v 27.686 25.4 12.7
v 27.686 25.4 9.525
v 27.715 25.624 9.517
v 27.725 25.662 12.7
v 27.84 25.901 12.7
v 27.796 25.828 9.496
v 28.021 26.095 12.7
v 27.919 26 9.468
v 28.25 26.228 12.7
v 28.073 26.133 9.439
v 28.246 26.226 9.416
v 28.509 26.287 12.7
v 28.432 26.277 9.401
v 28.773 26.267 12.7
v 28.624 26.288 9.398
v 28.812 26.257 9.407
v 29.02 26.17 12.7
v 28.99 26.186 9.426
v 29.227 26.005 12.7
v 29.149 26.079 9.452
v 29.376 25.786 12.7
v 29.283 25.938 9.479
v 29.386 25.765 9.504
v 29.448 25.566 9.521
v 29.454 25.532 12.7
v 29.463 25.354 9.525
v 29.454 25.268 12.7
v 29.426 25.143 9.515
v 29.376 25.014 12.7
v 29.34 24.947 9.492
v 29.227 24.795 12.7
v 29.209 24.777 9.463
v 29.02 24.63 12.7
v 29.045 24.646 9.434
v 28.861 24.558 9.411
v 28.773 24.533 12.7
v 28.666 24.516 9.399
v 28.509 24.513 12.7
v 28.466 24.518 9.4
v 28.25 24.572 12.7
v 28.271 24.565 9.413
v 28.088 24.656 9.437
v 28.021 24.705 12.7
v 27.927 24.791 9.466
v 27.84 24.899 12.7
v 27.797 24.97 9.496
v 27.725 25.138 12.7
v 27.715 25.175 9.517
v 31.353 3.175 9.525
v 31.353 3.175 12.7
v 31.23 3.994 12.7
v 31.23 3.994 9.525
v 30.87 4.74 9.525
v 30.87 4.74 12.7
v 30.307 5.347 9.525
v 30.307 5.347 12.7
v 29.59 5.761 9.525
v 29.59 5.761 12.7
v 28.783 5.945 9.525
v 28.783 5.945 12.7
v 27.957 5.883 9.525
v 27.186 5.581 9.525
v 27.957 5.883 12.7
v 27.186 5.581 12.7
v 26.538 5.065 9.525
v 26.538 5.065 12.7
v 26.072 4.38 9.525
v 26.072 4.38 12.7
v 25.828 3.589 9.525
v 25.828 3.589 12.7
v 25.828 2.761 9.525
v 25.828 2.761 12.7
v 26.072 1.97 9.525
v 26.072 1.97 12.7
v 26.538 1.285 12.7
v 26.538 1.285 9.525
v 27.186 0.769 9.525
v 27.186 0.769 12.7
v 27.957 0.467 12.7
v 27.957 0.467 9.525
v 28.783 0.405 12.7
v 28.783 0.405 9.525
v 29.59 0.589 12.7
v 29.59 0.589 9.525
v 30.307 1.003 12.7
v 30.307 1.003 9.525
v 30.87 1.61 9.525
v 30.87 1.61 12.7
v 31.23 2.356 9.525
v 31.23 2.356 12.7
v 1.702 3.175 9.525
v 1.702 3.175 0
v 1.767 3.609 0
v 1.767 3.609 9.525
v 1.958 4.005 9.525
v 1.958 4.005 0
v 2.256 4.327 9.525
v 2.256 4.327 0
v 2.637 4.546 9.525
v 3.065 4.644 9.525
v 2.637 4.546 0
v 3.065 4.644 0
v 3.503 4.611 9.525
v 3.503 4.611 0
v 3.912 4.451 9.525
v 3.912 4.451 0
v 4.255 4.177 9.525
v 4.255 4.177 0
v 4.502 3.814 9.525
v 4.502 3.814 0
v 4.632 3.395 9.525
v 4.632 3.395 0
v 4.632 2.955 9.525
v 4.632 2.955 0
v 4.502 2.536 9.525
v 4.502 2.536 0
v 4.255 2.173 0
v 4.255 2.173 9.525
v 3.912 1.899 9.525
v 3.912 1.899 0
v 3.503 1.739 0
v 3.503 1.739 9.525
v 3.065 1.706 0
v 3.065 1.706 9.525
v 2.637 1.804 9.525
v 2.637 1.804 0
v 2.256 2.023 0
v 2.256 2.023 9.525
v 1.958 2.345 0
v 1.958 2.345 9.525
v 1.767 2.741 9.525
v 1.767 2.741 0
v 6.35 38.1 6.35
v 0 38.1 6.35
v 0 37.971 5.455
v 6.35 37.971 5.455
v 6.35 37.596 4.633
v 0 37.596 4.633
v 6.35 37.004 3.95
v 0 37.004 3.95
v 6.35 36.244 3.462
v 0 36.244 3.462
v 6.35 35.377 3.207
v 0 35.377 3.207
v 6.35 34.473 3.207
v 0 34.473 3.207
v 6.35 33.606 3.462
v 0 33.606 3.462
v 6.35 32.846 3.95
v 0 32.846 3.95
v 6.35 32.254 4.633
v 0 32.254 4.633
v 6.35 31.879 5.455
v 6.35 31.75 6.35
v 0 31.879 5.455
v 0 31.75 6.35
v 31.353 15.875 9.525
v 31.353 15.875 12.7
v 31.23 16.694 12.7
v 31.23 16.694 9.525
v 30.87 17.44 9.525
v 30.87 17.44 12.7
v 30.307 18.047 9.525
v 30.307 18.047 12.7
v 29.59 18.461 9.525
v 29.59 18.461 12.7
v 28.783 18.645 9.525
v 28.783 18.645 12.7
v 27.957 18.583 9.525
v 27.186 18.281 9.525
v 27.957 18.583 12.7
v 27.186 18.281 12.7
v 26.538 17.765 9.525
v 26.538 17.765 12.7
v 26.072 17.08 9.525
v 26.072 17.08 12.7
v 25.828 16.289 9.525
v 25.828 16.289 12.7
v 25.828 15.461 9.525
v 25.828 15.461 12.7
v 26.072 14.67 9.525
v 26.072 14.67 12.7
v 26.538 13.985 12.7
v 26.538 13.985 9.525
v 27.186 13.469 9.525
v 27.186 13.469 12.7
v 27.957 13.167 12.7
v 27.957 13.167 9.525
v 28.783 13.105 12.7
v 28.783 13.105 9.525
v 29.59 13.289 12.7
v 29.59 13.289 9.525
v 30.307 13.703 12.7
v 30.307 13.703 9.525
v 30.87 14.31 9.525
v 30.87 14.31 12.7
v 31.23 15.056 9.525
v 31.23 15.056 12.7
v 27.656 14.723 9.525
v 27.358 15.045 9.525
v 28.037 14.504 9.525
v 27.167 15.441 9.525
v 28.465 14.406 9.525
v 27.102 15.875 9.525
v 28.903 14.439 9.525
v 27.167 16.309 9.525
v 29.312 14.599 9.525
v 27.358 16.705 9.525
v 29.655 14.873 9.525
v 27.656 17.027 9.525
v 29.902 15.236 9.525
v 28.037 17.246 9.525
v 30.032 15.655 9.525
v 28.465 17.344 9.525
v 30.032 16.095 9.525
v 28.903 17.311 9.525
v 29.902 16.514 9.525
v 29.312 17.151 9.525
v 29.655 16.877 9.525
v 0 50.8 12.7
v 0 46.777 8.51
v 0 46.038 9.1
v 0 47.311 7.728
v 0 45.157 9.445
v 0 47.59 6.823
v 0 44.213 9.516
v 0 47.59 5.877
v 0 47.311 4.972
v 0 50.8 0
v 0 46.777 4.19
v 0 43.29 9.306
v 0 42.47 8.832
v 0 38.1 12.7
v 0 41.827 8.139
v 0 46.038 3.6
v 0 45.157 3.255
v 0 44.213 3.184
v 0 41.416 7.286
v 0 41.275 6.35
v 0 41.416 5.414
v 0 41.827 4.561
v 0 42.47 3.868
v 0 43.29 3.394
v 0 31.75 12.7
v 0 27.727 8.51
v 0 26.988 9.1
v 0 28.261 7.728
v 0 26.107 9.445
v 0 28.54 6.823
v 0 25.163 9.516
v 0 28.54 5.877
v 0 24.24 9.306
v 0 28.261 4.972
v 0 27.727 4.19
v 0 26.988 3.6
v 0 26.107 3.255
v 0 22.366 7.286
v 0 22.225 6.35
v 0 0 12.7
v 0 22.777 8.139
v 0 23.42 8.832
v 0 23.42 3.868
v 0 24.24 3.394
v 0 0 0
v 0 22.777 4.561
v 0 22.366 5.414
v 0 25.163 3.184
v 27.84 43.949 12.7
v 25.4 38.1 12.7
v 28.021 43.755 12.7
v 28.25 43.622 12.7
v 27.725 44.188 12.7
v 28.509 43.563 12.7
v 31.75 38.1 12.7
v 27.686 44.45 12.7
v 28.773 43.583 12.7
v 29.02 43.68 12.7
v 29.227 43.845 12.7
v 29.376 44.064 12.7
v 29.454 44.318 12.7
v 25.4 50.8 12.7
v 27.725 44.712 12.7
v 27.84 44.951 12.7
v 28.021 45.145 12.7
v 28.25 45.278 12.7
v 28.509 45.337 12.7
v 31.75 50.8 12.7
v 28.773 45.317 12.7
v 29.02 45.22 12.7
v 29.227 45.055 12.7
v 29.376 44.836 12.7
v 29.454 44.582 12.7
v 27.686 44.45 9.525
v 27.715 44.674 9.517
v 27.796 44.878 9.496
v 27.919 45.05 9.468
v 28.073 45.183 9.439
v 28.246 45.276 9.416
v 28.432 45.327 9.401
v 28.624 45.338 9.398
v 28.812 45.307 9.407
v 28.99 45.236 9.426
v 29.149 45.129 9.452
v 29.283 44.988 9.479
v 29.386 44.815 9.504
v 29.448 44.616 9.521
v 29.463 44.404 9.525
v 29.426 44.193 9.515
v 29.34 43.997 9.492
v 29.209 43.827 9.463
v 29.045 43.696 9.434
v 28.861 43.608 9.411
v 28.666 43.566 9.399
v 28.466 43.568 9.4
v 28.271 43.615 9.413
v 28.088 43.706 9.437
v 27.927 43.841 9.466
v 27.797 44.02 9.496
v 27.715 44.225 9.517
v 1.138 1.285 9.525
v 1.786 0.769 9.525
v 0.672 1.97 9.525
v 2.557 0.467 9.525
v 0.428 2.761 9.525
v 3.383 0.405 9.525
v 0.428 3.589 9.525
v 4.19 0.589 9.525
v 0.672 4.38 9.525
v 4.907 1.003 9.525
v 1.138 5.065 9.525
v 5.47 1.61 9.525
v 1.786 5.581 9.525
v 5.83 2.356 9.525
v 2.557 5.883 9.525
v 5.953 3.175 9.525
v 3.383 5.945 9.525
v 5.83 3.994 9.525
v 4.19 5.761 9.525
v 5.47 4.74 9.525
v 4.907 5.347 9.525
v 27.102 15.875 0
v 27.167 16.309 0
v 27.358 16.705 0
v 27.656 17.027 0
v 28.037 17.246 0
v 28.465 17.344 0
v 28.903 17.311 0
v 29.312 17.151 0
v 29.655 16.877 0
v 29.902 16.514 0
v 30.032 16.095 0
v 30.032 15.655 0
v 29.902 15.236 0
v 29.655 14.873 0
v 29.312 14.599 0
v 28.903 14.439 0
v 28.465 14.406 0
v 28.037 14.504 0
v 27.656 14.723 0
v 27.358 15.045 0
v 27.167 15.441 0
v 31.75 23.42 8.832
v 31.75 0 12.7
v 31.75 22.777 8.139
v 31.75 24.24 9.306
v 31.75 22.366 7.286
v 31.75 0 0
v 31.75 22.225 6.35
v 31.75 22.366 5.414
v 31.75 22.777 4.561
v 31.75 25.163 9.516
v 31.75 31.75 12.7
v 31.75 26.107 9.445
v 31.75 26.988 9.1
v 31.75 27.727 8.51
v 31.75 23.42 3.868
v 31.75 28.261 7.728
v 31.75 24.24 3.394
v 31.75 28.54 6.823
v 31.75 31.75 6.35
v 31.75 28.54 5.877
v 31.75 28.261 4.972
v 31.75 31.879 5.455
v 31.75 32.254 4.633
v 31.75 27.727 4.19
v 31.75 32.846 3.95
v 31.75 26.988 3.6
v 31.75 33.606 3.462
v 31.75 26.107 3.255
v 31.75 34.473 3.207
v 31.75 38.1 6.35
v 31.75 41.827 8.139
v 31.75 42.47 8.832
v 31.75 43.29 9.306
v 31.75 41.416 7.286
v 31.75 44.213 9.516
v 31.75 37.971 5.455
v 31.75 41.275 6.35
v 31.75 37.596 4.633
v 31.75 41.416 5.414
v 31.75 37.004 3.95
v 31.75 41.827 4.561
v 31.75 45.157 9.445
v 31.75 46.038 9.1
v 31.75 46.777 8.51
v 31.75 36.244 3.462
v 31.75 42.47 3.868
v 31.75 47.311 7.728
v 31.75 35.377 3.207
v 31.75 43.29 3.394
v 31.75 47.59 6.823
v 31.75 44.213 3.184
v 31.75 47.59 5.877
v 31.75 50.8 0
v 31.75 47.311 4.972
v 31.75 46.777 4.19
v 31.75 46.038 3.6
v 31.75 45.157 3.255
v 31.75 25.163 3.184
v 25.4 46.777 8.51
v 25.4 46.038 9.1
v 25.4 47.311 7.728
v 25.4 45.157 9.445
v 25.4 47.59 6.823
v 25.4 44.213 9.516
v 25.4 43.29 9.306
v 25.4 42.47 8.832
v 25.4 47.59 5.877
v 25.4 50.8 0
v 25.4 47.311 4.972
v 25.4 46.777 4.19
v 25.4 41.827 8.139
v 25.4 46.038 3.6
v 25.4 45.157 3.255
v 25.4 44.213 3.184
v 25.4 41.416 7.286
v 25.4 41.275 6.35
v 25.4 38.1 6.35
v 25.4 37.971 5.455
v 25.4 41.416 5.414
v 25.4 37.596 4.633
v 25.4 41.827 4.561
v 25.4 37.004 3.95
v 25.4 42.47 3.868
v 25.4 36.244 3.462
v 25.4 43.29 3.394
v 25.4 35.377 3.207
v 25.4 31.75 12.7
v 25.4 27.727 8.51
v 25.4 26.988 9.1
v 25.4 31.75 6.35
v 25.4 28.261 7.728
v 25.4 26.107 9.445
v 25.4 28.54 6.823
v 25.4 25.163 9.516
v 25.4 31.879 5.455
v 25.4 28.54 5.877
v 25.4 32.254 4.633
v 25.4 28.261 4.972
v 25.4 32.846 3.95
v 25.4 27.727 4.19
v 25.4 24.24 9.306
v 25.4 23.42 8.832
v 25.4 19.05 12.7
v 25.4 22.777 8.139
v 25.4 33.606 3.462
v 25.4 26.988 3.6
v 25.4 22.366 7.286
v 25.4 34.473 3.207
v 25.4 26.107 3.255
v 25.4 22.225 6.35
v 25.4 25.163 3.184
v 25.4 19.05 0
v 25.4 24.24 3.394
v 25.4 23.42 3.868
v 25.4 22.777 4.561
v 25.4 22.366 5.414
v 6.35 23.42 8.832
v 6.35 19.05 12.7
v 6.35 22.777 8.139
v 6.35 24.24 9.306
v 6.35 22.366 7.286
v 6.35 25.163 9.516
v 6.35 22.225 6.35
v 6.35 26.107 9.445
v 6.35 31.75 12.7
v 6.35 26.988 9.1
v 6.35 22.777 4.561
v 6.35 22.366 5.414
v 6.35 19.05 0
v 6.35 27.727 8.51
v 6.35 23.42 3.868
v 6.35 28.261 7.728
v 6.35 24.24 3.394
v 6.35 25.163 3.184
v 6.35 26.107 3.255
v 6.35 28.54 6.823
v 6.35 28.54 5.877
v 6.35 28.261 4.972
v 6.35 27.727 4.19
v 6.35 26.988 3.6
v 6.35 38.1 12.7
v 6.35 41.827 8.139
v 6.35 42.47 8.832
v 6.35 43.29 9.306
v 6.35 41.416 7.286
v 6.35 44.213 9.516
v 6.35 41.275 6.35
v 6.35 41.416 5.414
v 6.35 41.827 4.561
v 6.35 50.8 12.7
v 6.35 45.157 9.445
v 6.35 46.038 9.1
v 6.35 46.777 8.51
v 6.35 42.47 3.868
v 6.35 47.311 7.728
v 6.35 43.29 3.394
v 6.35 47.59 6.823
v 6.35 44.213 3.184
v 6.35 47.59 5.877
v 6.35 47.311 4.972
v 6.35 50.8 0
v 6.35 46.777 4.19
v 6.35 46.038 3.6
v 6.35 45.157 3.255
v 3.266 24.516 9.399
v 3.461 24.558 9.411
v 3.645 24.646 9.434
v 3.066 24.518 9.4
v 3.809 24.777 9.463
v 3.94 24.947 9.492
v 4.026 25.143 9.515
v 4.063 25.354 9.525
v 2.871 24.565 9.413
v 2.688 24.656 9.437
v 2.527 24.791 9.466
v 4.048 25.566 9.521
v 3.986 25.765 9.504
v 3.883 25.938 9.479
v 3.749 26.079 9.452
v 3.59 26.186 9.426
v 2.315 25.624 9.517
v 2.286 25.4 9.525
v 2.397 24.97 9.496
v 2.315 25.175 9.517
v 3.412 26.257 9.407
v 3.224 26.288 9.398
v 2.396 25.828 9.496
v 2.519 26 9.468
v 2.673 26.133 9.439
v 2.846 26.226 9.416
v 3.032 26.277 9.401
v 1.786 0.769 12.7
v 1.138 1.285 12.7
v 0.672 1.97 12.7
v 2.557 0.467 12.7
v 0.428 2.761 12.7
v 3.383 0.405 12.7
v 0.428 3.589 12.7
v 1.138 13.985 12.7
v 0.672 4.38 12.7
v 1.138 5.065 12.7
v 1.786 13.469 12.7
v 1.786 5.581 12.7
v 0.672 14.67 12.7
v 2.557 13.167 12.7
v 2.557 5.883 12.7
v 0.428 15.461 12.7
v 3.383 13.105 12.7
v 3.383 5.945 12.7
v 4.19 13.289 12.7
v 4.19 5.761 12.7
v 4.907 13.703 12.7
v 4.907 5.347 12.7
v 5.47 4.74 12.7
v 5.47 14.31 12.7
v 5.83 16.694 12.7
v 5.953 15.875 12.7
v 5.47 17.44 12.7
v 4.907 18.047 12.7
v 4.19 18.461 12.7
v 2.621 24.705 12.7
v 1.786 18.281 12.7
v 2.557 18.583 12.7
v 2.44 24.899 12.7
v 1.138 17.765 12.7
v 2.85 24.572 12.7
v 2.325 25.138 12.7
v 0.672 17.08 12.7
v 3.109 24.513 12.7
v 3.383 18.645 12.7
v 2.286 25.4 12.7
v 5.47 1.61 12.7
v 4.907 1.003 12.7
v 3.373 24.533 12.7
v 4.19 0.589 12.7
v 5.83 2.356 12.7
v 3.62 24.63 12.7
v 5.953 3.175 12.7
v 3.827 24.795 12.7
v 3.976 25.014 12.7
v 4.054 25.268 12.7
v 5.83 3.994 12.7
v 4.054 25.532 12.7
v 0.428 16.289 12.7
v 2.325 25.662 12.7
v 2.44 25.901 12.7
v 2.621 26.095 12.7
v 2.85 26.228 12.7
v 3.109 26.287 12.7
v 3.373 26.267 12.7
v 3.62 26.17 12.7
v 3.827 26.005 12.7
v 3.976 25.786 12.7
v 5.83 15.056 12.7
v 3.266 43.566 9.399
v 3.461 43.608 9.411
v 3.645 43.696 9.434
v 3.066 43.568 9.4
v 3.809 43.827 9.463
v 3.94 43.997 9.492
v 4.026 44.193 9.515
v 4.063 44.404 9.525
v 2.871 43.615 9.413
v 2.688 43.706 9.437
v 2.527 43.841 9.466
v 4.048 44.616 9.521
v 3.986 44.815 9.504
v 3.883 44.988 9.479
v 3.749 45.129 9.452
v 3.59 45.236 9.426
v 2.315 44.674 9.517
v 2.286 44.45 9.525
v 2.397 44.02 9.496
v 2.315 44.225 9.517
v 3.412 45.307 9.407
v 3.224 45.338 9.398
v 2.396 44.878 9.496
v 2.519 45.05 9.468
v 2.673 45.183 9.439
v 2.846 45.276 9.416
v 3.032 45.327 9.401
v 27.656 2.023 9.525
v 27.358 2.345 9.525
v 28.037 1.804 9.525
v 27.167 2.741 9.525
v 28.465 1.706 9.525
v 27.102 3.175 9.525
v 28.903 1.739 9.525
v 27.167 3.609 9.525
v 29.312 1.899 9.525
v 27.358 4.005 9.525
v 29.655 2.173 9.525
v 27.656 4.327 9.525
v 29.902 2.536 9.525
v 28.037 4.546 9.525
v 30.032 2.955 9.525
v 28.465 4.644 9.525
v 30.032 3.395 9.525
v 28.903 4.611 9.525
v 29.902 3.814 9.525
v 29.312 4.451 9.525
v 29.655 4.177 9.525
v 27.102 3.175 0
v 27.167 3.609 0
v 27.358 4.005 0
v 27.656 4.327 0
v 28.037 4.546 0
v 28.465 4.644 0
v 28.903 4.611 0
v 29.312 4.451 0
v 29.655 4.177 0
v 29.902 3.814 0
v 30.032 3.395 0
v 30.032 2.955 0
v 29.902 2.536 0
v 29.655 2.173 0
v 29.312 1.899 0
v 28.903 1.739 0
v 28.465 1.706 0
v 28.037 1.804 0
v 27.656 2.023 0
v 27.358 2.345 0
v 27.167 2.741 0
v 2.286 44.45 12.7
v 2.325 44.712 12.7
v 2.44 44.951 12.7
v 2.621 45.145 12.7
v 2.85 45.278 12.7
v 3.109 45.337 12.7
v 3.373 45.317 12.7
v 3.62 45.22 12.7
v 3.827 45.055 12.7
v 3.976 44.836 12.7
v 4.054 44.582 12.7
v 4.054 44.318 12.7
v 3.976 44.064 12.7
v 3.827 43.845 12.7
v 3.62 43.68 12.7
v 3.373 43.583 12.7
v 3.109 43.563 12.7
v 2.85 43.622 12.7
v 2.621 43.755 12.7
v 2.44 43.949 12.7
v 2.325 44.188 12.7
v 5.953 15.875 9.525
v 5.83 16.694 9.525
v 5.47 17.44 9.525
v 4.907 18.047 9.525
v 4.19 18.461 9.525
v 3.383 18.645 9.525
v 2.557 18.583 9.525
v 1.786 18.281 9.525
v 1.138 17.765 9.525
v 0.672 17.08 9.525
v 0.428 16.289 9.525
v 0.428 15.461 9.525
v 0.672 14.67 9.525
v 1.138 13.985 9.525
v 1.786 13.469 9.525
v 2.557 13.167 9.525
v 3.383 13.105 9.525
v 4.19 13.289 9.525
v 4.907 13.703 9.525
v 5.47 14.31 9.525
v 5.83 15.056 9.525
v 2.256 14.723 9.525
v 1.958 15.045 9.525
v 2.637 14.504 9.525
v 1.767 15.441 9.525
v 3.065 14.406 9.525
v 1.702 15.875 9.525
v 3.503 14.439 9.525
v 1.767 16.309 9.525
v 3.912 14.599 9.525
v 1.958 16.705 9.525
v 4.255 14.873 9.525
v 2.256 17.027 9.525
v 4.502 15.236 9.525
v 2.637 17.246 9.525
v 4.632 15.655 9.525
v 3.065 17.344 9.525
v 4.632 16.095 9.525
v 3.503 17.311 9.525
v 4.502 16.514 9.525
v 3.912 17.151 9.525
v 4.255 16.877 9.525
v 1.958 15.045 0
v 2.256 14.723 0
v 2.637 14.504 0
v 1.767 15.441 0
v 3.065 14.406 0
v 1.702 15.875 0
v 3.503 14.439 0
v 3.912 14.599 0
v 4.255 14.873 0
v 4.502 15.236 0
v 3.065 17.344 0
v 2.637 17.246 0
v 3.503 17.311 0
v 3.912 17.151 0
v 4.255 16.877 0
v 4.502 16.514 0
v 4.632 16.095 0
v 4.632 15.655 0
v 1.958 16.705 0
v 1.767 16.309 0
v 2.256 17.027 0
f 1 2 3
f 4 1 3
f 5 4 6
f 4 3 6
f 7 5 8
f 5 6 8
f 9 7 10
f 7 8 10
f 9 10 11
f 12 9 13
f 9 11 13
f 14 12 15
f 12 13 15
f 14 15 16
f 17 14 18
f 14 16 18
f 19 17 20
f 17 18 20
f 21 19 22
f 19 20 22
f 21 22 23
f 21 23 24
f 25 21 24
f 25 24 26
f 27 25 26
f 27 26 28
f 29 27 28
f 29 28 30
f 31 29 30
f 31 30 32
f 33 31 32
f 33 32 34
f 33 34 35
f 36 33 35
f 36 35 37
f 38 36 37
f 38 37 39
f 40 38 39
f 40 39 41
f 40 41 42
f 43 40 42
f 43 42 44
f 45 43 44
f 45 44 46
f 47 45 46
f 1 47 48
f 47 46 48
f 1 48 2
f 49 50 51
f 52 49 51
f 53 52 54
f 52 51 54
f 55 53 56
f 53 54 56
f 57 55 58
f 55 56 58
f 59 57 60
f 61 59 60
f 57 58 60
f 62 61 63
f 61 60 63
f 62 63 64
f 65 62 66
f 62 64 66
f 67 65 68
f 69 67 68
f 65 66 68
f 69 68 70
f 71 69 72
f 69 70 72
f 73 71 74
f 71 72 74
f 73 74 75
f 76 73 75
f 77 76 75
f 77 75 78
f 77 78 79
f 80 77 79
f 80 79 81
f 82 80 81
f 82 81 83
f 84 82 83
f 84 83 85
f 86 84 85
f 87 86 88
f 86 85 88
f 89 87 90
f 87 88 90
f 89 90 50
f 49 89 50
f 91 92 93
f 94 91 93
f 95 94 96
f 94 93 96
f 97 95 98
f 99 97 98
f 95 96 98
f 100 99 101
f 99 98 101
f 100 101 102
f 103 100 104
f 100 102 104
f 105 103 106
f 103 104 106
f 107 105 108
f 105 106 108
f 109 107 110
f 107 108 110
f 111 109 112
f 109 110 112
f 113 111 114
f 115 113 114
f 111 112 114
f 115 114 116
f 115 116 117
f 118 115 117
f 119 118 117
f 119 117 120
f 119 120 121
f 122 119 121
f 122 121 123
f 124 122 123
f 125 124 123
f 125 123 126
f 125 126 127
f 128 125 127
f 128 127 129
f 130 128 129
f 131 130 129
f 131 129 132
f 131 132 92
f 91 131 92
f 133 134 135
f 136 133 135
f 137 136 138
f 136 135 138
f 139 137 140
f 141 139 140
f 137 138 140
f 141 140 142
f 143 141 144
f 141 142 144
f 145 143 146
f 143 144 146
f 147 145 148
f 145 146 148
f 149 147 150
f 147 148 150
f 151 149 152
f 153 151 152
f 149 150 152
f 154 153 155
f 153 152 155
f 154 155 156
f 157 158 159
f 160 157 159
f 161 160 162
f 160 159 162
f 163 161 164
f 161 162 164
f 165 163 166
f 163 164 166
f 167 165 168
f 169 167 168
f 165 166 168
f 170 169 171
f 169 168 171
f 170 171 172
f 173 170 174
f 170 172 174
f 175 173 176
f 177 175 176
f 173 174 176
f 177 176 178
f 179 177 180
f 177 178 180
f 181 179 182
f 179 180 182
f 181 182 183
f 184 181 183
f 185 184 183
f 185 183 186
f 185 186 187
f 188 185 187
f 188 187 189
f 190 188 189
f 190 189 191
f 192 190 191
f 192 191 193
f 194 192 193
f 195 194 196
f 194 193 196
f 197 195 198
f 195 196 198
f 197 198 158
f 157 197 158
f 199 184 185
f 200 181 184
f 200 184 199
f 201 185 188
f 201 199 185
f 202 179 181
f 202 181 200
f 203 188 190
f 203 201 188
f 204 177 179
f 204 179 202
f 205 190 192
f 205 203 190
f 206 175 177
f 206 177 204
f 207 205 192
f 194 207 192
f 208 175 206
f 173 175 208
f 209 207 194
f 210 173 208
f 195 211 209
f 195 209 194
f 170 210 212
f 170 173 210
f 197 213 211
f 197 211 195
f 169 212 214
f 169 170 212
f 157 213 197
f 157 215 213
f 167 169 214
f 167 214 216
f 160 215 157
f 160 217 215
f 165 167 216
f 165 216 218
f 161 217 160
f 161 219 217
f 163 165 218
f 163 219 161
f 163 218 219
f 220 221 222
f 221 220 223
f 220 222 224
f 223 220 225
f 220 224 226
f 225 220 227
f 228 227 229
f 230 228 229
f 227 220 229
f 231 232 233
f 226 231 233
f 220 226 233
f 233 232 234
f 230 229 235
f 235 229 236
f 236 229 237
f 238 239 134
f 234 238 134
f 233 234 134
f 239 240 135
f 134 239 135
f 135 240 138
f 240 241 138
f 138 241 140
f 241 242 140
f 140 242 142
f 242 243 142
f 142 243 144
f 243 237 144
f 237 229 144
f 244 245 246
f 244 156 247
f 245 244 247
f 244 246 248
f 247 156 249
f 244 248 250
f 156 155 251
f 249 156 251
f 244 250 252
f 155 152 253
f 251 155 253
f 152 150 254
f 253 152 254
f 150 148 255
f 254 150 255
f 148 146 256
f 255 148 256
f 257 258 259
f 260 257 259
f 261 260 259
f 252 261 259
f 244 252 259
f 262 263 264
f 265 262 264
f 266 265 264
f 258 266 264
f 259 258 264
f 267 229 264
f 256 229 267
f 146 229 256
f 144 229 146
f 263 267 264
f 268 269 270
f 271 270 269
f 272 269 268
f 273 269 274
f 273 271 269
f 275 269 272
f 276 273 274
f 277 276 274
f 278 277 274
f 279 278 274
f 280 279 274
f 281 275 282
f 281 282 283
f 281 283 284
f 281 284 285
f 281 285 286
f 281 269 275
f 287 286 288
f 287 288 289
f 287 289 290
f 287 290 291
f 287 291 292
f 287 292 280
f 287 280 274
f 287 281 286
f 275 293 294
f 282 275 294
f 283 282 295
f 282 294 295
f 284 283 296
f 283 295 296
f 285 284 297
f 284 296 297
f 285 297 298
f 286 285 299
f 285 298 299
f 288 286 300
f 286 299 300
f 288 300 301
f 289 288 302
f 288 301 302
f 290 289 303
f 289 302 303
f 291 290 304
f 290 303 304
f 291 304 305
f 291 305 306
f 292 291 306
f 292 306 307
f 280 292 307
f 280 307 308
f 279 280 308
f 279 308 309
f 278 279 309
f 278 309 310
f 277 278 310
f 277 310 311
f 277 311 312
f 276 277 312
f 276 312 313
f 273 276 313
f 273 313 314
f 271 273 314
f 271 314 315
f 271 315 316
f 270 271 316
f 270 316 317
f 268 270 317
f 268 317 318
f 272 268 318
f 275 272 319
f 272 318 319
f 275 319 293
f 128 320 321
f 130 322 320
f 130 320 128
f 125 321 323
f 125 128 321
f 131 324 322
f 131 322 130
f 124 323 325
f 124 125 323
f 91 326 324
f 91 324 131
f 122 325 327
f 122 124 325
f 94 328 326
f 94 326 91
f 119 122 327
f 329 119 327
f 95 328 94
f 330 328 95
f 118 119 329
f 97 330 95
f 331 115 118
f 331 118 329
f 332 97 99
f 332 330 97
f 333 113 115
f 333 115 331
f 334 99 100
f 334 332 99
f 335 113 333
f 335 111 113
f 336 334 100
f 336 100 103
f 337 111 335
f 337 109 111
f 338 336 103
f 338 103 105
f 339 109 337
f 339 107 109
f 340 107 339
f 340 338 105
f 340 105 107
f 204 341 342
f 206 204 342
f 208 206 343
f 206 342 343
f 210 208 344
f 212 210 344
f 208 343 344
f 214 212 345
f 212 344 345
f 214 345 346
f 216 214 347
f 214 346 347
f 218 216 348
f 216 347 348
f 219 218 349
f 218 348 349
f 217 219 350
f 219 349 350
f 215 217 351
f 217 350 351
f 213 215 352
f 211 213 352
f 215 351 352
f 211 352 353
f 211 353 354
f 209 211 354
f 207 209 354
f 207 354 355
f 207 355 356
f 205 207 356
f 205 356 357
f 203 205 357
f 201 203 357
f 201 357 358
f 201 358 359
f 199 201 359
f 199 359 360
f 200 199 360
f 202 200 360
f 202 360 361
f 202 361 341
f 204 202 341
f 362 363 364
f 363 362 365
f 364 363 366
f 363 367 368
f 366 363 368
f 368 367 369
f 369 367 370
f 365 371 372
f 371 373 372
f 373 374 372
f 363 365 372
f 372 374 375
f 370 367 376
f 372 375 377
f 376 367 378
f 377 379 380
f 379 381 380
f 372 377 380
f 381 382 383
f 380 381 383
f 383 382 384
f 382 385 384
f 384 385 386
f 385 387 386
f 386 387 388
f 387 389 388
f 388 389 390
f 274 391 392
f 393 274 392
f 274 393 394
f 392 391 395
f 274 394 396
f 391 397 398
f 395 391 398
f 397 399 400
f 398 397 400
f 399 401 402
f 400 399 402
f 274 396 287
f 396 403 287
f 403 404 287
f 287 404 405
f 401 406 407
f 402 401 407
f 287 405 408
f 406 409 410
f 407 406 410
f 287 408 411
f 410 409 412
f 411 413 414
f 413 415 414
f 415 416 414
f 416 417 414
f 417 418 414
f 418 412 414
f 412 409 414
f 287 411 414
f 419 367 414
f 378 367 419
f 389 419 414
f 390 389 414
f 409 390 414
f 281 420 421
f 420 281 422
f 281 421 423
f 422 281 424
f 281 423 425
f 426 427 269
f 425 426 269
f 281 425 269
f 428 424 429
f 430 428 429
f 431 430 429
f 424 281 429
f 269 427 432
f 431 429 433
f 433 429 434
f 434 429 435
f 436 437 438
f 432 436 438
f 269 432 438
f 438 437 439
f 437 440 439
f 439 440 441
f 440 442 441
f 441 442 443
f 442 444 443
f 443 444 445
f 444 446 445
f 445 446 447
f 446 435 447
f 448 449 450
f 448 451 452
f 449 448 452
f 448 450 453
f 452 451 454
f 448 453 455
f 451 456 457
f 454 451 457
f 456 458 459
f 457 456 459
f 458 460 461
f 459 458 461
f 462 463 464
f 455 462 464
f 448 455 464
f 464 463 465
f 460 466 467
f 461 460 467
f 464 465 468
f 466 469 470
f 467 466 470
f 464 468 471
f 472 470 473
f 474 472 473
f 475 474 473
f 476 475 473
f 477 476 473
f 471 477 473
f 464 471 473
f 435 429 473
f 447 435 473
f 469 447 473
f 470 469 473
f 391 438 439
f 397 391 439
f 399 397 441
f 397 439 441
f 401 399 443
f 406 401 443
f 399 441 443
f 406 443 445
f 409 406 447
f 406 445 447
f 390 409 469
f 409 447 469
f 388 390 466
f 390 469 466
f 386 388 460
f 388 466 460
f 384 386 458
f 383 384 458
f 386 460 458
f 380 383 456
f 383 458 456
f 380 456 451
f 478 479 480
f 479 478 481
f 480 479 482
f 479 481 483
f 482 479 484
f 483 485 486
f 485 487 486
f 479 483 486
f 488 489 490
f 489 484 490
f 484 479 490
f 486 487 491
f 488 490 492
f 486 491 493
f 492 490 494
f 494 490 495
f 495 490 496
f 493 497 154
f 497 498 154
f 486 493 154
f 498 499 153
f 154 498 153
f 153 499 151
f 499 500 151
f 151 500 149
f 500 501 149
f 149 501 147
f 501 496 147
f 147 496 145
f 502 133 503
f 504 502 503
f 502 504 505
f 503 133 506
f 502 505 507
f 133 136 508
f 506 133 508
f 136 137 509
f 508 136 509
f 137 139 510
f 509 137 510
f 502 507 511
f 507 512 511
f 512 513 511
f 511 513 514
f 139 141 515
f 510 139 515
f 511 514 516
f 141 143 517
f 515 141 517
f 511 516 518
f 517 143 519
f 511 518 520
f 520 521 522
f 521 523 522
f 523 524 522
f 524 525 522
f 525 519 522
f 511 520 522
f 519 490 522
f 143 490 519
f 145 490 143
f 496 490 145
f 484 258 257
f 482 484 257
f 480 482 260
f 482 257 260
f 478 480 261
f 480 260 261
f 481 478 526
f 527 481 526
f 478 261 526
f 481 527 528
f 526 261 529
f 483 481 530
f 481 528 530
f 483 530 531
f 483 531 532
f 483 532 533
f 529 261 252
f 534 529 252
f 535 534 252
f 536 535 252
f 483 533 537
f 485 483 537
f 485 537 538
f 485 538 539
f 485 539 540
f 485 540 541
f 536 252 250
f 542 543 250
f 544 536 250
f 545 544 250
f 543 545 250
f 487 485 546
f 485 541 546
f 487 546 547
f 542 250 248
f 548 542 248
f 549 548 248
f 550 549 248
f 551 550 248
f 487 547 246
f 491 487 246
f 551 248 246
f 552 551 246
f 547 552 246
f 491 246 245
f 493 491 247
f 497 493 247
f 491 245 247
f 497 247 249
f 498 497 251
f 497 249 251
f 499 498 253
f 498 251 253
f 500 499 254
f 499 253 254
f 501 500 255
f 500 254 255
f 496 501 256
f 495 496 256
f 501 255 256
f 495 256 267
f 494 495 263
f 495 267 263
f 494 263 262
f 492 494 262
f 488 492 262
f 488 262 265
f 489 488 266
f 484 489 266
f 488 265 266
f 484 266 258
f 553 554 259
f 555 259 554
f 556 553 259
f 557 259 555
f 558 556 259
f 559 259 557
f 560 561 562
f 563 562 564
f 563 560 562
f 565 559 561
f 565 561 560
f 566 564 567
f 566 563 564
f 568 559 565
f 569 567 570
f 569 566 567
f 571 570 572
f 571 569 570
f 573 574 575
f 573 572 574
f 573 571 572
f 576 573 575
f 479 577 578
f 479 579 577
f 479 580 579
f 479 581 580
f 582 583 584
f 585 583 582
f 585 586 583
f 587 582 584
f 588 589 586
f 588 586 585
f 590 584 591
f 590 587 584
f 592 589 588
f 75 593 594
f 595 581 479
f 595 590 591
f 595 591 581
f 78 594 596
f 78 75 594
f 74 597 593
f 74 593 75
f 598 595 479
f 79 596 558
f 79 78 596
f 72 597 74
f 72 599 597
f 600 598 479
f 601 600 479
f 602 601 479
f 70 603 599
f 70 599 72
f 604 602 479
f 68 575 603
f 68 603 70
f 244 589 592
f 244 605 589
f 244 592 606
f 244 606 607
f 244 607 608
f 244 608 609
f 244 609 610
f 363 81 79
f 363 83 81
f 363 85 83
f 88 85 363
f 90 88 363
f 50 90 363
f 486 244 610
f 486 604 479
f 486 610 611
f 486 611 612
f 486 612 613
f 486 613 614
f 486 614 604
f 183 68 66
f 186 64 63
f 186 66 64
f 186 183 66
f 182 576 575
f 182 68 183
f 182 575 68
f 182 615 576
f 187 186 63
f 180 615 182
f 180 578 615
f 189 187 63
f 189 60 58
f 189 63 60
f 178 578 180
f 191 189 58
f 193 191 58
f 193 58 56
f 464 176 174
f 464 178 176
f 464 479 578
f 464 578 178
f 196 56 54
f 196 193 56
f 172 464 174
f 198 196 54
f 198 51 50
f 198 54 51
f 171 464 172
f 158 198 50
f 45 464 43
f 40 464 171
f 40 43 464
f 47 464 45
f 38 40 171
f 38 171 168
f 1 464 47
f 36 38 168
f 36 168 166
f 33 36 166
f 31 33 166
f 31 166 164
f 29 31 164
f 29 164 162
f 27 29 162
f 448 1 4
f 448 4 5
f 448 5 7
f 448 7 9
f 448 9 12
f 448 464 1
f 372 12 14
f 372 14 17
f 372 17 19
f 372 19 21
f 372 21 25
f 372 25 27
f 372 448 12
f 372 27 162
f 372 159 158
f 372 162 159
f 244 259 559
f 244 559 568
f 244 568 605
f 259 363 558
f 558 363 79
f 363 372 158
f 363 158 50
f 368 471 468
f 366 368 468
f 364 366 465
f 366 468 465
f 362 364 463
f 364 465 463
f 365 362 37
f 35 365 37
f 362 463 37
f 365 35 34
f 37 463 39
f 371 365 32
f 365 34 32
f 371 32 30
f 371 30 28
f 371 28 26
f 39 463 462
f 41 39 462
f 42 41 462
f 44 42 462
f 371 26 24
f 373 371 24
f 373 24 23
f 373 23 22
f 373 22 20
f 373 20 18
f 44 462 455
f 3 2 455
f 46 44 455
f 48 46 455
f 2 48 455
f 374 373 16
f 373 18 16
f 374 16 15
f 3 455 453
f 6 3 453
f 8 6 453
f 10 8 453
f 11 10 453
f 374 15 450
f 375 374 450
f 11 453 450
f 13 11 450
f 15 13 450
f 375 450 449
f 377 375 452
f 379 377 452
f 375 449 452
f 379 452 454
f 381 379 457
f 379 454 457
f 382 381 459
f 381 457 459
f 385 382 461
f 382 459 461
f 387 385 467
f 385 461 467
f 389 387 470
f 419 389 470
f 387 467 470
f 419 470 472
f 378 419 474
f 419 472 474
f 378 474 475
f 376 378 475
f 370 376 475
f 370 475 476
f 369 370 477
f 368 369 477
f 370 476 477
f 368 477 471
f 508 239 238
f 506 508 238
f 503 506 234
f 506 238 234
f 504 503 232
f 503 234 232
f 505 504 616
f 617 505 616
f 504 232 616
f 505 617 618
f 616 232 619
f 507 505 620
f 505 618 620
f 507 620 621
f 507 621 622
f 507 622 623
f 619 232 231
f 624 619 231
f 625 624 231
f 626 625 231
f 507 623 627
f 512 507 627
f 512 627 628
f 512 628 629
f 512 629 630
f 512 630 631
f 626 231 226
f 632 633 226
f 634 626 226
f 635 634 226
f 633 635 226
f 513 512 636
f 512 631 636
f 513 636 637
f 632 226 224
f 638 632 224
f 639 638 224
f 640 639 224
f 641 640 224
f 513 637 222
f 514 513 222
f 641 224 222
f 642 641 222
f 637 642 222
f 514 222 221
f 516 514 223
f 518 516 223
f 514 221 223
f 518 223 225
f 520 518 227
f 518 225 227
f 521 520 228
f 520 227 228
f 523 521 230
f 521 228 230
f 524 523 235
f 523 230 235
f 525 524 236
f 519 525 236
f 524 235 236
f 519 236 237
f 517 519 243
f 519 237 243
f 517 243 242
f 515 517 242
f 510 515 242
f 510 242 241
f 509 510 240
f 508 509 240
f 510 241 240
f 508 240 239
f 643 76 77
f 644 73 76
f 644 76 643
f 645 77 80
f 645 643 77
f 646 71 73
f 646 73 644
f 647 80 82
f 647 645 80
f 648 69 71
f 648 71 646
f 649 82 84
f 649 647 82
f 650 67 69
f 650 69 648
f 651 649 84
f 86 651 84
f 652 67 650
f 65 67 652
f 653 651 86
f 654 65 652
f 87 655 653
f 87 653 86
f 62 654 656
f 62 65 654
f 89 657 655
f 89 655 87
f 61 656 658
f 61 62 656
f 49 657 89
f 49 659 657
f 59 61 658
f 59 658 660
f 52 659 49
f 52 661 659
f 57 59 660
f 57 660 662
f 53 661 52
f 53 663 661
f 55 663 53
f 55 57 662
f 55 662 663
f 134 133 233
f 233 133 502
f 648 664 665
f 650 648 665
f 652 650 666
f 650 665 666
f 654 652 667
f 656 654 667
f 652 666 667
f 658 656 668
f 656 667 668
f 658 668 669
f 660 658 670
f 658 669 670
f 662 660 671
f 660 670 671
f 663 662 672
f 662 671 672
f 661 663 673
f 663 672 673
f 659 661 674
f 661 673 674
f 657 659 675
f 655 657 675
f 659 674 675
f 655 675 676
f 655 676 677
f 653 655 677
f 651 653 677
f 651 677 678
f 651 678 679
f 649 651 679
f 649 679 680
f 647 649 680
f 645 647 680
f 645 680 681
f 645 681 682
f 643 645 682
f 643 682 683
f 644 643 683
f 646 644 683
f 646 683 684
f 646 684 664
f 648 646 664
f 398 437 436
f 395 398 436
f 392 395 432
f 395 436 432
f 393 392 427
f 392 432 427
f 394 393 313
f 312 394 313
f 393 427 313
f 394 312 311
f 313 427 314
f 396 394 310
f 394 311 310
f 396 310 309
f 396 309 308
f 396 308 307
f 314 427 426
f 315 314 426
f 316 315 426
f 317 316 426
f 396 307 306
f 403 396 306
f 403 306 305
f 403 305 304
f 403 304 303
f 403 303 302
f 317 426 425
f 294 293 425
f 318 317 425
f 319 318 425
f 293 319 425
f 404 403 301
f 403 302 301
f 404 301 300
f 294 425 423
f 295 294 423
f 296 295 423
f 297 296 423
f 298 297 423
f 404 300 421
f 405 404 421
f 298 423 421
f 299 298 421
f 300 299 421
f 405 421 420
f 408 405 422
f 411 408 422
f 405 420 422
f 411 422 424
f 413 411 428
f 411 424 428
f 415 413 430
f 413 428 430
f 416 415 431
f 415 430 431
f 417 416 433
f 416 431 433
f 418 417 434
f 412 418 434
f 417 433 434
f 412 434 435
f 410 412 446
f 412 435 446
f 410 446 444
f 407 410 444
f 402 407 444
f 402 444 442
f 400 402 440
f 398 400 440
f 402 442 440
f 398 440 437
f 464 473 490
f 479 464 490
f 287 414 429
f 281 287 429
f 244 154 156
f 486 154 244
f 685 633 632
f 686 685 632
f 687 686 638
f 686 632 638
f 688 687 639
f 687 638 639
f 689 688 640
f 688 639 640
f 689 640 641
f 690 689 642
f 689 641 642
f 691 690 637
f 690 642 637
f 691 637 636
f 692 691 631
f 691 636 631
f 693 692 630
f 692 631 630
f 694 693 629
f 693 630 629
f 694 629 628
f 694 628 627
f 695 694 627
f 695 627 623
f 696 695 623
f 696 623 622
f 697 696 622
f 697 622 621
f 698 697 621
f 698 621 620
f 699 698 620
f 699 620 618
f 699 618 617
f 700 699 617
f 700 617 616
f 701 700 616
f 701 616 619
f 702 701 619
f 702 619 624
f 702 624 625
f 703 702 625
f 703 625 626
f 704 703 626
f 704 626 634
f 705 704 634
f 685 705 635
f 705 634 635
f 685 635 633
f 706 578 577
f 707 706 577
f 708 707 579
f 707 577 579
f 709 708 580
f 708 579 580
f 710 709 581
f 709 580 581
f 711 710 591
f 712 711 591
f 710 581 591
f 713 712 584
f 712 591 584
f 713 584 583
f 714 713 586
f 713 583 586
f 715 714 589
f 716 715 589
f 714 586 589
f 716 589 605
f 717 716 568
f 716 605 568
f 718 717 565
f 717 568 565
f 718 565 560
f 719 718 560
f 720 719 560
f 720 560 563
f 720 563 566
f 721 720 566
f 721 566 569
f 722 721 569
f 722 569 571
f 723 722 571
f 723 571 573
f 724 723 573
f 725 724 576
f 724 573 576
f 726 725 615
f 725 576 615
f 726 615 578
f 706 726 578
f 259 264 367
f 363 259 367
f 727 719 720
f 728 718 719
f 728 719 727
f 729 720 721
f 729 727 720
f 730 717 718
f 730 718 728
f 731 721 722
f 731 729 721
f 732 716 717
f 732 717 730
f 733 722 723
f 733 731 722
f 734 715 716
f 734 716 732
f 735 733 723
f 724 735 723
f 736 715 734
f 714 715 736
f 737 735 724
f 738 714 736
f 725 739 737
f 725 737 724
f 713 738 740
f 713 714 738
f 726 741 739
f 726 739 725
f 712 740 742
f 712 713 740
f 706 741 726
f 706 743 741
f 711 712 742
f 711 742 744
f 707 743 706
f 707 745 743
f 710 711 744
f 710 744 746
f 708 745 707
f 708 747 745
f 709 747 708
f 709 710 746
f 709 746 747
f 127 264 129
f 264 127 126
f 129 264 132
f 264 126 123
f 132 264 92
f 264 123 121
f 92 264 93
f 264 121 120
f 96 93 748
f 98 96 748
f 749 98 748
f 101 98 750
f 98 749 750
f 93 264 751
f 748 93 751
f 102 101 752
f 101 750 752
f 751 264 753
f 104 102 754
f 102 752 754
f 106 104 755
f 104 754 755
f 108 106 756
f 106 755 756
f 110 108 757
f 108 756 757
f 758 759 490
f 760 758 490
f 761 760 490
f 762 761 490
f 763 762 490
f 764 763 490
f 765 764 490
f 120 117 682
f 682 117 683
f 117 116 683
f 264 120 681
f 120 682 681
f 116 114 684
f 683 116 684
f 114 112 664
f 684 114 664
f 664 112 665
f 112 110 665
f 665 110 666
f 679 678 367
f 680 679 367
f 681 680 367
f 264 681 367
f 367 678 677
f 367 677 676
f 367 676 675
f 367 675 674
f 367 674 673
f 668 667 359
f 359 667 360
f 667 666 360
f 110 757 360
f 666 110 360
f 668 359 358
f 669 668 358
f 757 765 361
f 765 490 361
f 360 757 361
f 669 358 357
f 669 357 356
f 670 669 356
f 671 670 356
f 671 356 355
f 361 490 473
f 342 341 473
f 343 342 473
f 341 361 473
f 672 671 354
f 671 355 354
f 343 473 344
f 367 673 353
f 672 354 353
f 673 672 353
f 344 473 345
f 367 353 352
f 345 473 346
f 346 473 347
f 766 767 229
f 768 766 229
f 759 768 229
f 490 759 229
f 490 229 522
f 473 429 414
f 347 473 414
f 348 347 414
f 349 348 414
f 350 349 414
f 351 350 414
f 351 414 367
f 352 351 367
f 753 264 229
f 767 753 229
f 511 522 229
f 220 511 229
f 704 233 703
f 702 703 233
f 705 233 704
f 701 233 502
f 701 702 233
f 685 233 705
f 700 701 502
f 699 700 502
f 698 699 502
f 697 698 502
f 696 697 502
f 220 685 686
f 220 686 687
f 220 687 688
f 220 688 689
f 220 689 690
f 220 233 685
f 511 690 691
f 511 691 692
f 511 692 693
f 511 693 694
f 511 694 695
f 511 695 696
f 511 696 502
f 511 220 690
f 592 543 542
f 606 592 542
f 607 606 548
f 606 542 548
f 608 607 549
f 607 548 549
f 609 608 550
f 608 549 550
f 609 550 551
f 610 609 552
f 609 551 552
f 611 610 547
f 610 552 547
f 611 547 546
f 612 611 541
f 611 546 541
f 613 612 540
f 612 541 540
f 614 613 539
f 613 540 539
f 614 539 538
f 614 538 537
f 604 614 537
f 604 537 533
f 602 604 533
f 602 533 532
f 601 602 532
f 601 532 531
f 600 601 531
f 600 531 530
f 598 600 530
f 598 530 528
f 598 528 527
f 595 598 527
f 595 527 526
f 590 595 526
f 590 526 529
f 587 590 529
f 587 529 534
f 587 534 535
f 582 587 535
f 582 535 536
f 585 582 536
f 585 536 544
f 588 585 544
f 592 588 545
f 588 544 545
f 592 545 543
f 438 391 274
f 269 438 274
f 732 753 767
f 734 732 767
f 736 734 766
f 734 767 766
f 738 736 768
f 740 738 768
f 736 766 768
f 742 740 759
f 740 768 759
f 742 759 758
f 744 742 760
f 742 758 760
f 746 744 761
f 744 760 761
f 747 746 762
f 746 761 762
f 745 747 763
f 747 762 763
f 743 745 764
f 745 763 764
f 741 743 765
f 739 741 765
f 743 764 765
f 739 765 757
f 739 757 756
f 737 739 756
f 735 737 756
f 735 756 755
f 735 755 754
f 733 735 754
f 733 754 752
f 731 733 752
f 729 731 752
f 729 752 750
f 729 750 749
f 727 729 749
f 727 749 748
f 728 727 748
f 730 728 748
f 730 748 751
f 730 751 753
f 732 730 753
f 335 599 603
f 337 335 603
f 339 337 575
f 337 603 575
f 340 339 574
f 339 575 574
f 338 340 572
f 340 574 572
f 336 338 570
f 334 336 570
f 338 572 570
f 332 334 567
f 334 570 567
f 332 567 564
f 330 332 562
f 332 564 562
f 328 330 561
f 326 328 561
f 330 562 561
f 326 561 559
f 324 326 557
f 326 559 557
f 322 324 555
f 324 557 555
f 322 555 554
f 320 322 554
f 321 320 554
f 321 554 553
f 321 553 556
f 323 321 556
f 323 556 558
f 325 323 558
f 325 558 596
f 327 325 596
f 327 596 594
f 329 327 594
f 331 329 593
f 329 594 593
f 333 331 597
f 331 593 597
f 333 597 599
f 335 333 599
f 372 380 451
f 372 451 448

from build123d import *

# Parameters (mm, degrees)
F1_DEPTH  = 12.7
F3_D      = 2.9464
F5_D      = 6.35
F6_W      = 6.35
F6_H      = 6.35
F7_DEPTH  = 31.751
F8_DEPTH  = 31.751
F9_R      = 2.778125
F10_DEPTH = 3.175
F13_D     = 1.778
F13_DEPTH = 6.35


with BuildPart() as f1:
    # F0 (on Top) → F1 (new body)
    with BuildSketch(Plane.XY):
        Polygon((0, 19.05), (0, 0), (31.75, 0), (31.75, 19.05), (31.75, 50.8), (25.4, 50.8), (25.4, 19.05), (6.35, 19.05), (6.35, 50.8), (0, 50.8), align=None)
    extrude(amount=F1_DEPTH)

    # F3 (through all)
    with Locations(Plane.XY.offset(12.7)):
        with Locations((3.175, 15.875), (3.175, 3.175), (28.575, 15.875), (28.575, 3.175)):
            Hole(F3_D / 2)

    # F5 (through all)
    with Locations(Plane.YZ.offset(31.75)):
        with Locations((25.4, 6.35), (44.45, 6.35), (34.925, 6.35)):
            Hole(F5_D / 2)

    # F6 (on face) → F7 (cut, through all)
    with BuildSketch(Plane.YZ.offset(31.75)):
        with Locations((34.925, 9.525)):
            Rectangle(F6_W, F6_H)
    extrude(amount=-F7_DEPTH, mode=Mode.SUBTRACT)

    # F6 (on face) → F8 (cut, through all)
    with BuildSketch(Plane.YZ.offset(31.75)):
        with Locations((34.925, 9.525)):
            Rectangle(F6_W, F6_H)
    extrude(amount=-F8_DEPTH, mode=Mode.SUBTRACT)

    # F9 (on face) → F10 (cut)
    with BuildSketch(Plane.XY.offset(12.7)):
        with Locations((3.175, 3.175)):
            Circle(F9_R)
        with Locations((3.175, 15.875)):
            Circle(F9_R)
        with Locations((28.575, 3.175)):
            Circle(F9_R)
        with Locations((28.575, 15.875)):
            Circle(F9_R)
    extrude(amount=-F10_DEPTH, mode=Mode.SUBTRACT)

    # F13
    with Locations(Plane.XY.offset(12.7)):
        with Locations((3.175, 25.4), (3.175, 44.45), (28.575, 25.4), (28.575, 44.45)):
            Hole(F13_D / 2, depth=F13_DEPTH)


solid = f1.part
